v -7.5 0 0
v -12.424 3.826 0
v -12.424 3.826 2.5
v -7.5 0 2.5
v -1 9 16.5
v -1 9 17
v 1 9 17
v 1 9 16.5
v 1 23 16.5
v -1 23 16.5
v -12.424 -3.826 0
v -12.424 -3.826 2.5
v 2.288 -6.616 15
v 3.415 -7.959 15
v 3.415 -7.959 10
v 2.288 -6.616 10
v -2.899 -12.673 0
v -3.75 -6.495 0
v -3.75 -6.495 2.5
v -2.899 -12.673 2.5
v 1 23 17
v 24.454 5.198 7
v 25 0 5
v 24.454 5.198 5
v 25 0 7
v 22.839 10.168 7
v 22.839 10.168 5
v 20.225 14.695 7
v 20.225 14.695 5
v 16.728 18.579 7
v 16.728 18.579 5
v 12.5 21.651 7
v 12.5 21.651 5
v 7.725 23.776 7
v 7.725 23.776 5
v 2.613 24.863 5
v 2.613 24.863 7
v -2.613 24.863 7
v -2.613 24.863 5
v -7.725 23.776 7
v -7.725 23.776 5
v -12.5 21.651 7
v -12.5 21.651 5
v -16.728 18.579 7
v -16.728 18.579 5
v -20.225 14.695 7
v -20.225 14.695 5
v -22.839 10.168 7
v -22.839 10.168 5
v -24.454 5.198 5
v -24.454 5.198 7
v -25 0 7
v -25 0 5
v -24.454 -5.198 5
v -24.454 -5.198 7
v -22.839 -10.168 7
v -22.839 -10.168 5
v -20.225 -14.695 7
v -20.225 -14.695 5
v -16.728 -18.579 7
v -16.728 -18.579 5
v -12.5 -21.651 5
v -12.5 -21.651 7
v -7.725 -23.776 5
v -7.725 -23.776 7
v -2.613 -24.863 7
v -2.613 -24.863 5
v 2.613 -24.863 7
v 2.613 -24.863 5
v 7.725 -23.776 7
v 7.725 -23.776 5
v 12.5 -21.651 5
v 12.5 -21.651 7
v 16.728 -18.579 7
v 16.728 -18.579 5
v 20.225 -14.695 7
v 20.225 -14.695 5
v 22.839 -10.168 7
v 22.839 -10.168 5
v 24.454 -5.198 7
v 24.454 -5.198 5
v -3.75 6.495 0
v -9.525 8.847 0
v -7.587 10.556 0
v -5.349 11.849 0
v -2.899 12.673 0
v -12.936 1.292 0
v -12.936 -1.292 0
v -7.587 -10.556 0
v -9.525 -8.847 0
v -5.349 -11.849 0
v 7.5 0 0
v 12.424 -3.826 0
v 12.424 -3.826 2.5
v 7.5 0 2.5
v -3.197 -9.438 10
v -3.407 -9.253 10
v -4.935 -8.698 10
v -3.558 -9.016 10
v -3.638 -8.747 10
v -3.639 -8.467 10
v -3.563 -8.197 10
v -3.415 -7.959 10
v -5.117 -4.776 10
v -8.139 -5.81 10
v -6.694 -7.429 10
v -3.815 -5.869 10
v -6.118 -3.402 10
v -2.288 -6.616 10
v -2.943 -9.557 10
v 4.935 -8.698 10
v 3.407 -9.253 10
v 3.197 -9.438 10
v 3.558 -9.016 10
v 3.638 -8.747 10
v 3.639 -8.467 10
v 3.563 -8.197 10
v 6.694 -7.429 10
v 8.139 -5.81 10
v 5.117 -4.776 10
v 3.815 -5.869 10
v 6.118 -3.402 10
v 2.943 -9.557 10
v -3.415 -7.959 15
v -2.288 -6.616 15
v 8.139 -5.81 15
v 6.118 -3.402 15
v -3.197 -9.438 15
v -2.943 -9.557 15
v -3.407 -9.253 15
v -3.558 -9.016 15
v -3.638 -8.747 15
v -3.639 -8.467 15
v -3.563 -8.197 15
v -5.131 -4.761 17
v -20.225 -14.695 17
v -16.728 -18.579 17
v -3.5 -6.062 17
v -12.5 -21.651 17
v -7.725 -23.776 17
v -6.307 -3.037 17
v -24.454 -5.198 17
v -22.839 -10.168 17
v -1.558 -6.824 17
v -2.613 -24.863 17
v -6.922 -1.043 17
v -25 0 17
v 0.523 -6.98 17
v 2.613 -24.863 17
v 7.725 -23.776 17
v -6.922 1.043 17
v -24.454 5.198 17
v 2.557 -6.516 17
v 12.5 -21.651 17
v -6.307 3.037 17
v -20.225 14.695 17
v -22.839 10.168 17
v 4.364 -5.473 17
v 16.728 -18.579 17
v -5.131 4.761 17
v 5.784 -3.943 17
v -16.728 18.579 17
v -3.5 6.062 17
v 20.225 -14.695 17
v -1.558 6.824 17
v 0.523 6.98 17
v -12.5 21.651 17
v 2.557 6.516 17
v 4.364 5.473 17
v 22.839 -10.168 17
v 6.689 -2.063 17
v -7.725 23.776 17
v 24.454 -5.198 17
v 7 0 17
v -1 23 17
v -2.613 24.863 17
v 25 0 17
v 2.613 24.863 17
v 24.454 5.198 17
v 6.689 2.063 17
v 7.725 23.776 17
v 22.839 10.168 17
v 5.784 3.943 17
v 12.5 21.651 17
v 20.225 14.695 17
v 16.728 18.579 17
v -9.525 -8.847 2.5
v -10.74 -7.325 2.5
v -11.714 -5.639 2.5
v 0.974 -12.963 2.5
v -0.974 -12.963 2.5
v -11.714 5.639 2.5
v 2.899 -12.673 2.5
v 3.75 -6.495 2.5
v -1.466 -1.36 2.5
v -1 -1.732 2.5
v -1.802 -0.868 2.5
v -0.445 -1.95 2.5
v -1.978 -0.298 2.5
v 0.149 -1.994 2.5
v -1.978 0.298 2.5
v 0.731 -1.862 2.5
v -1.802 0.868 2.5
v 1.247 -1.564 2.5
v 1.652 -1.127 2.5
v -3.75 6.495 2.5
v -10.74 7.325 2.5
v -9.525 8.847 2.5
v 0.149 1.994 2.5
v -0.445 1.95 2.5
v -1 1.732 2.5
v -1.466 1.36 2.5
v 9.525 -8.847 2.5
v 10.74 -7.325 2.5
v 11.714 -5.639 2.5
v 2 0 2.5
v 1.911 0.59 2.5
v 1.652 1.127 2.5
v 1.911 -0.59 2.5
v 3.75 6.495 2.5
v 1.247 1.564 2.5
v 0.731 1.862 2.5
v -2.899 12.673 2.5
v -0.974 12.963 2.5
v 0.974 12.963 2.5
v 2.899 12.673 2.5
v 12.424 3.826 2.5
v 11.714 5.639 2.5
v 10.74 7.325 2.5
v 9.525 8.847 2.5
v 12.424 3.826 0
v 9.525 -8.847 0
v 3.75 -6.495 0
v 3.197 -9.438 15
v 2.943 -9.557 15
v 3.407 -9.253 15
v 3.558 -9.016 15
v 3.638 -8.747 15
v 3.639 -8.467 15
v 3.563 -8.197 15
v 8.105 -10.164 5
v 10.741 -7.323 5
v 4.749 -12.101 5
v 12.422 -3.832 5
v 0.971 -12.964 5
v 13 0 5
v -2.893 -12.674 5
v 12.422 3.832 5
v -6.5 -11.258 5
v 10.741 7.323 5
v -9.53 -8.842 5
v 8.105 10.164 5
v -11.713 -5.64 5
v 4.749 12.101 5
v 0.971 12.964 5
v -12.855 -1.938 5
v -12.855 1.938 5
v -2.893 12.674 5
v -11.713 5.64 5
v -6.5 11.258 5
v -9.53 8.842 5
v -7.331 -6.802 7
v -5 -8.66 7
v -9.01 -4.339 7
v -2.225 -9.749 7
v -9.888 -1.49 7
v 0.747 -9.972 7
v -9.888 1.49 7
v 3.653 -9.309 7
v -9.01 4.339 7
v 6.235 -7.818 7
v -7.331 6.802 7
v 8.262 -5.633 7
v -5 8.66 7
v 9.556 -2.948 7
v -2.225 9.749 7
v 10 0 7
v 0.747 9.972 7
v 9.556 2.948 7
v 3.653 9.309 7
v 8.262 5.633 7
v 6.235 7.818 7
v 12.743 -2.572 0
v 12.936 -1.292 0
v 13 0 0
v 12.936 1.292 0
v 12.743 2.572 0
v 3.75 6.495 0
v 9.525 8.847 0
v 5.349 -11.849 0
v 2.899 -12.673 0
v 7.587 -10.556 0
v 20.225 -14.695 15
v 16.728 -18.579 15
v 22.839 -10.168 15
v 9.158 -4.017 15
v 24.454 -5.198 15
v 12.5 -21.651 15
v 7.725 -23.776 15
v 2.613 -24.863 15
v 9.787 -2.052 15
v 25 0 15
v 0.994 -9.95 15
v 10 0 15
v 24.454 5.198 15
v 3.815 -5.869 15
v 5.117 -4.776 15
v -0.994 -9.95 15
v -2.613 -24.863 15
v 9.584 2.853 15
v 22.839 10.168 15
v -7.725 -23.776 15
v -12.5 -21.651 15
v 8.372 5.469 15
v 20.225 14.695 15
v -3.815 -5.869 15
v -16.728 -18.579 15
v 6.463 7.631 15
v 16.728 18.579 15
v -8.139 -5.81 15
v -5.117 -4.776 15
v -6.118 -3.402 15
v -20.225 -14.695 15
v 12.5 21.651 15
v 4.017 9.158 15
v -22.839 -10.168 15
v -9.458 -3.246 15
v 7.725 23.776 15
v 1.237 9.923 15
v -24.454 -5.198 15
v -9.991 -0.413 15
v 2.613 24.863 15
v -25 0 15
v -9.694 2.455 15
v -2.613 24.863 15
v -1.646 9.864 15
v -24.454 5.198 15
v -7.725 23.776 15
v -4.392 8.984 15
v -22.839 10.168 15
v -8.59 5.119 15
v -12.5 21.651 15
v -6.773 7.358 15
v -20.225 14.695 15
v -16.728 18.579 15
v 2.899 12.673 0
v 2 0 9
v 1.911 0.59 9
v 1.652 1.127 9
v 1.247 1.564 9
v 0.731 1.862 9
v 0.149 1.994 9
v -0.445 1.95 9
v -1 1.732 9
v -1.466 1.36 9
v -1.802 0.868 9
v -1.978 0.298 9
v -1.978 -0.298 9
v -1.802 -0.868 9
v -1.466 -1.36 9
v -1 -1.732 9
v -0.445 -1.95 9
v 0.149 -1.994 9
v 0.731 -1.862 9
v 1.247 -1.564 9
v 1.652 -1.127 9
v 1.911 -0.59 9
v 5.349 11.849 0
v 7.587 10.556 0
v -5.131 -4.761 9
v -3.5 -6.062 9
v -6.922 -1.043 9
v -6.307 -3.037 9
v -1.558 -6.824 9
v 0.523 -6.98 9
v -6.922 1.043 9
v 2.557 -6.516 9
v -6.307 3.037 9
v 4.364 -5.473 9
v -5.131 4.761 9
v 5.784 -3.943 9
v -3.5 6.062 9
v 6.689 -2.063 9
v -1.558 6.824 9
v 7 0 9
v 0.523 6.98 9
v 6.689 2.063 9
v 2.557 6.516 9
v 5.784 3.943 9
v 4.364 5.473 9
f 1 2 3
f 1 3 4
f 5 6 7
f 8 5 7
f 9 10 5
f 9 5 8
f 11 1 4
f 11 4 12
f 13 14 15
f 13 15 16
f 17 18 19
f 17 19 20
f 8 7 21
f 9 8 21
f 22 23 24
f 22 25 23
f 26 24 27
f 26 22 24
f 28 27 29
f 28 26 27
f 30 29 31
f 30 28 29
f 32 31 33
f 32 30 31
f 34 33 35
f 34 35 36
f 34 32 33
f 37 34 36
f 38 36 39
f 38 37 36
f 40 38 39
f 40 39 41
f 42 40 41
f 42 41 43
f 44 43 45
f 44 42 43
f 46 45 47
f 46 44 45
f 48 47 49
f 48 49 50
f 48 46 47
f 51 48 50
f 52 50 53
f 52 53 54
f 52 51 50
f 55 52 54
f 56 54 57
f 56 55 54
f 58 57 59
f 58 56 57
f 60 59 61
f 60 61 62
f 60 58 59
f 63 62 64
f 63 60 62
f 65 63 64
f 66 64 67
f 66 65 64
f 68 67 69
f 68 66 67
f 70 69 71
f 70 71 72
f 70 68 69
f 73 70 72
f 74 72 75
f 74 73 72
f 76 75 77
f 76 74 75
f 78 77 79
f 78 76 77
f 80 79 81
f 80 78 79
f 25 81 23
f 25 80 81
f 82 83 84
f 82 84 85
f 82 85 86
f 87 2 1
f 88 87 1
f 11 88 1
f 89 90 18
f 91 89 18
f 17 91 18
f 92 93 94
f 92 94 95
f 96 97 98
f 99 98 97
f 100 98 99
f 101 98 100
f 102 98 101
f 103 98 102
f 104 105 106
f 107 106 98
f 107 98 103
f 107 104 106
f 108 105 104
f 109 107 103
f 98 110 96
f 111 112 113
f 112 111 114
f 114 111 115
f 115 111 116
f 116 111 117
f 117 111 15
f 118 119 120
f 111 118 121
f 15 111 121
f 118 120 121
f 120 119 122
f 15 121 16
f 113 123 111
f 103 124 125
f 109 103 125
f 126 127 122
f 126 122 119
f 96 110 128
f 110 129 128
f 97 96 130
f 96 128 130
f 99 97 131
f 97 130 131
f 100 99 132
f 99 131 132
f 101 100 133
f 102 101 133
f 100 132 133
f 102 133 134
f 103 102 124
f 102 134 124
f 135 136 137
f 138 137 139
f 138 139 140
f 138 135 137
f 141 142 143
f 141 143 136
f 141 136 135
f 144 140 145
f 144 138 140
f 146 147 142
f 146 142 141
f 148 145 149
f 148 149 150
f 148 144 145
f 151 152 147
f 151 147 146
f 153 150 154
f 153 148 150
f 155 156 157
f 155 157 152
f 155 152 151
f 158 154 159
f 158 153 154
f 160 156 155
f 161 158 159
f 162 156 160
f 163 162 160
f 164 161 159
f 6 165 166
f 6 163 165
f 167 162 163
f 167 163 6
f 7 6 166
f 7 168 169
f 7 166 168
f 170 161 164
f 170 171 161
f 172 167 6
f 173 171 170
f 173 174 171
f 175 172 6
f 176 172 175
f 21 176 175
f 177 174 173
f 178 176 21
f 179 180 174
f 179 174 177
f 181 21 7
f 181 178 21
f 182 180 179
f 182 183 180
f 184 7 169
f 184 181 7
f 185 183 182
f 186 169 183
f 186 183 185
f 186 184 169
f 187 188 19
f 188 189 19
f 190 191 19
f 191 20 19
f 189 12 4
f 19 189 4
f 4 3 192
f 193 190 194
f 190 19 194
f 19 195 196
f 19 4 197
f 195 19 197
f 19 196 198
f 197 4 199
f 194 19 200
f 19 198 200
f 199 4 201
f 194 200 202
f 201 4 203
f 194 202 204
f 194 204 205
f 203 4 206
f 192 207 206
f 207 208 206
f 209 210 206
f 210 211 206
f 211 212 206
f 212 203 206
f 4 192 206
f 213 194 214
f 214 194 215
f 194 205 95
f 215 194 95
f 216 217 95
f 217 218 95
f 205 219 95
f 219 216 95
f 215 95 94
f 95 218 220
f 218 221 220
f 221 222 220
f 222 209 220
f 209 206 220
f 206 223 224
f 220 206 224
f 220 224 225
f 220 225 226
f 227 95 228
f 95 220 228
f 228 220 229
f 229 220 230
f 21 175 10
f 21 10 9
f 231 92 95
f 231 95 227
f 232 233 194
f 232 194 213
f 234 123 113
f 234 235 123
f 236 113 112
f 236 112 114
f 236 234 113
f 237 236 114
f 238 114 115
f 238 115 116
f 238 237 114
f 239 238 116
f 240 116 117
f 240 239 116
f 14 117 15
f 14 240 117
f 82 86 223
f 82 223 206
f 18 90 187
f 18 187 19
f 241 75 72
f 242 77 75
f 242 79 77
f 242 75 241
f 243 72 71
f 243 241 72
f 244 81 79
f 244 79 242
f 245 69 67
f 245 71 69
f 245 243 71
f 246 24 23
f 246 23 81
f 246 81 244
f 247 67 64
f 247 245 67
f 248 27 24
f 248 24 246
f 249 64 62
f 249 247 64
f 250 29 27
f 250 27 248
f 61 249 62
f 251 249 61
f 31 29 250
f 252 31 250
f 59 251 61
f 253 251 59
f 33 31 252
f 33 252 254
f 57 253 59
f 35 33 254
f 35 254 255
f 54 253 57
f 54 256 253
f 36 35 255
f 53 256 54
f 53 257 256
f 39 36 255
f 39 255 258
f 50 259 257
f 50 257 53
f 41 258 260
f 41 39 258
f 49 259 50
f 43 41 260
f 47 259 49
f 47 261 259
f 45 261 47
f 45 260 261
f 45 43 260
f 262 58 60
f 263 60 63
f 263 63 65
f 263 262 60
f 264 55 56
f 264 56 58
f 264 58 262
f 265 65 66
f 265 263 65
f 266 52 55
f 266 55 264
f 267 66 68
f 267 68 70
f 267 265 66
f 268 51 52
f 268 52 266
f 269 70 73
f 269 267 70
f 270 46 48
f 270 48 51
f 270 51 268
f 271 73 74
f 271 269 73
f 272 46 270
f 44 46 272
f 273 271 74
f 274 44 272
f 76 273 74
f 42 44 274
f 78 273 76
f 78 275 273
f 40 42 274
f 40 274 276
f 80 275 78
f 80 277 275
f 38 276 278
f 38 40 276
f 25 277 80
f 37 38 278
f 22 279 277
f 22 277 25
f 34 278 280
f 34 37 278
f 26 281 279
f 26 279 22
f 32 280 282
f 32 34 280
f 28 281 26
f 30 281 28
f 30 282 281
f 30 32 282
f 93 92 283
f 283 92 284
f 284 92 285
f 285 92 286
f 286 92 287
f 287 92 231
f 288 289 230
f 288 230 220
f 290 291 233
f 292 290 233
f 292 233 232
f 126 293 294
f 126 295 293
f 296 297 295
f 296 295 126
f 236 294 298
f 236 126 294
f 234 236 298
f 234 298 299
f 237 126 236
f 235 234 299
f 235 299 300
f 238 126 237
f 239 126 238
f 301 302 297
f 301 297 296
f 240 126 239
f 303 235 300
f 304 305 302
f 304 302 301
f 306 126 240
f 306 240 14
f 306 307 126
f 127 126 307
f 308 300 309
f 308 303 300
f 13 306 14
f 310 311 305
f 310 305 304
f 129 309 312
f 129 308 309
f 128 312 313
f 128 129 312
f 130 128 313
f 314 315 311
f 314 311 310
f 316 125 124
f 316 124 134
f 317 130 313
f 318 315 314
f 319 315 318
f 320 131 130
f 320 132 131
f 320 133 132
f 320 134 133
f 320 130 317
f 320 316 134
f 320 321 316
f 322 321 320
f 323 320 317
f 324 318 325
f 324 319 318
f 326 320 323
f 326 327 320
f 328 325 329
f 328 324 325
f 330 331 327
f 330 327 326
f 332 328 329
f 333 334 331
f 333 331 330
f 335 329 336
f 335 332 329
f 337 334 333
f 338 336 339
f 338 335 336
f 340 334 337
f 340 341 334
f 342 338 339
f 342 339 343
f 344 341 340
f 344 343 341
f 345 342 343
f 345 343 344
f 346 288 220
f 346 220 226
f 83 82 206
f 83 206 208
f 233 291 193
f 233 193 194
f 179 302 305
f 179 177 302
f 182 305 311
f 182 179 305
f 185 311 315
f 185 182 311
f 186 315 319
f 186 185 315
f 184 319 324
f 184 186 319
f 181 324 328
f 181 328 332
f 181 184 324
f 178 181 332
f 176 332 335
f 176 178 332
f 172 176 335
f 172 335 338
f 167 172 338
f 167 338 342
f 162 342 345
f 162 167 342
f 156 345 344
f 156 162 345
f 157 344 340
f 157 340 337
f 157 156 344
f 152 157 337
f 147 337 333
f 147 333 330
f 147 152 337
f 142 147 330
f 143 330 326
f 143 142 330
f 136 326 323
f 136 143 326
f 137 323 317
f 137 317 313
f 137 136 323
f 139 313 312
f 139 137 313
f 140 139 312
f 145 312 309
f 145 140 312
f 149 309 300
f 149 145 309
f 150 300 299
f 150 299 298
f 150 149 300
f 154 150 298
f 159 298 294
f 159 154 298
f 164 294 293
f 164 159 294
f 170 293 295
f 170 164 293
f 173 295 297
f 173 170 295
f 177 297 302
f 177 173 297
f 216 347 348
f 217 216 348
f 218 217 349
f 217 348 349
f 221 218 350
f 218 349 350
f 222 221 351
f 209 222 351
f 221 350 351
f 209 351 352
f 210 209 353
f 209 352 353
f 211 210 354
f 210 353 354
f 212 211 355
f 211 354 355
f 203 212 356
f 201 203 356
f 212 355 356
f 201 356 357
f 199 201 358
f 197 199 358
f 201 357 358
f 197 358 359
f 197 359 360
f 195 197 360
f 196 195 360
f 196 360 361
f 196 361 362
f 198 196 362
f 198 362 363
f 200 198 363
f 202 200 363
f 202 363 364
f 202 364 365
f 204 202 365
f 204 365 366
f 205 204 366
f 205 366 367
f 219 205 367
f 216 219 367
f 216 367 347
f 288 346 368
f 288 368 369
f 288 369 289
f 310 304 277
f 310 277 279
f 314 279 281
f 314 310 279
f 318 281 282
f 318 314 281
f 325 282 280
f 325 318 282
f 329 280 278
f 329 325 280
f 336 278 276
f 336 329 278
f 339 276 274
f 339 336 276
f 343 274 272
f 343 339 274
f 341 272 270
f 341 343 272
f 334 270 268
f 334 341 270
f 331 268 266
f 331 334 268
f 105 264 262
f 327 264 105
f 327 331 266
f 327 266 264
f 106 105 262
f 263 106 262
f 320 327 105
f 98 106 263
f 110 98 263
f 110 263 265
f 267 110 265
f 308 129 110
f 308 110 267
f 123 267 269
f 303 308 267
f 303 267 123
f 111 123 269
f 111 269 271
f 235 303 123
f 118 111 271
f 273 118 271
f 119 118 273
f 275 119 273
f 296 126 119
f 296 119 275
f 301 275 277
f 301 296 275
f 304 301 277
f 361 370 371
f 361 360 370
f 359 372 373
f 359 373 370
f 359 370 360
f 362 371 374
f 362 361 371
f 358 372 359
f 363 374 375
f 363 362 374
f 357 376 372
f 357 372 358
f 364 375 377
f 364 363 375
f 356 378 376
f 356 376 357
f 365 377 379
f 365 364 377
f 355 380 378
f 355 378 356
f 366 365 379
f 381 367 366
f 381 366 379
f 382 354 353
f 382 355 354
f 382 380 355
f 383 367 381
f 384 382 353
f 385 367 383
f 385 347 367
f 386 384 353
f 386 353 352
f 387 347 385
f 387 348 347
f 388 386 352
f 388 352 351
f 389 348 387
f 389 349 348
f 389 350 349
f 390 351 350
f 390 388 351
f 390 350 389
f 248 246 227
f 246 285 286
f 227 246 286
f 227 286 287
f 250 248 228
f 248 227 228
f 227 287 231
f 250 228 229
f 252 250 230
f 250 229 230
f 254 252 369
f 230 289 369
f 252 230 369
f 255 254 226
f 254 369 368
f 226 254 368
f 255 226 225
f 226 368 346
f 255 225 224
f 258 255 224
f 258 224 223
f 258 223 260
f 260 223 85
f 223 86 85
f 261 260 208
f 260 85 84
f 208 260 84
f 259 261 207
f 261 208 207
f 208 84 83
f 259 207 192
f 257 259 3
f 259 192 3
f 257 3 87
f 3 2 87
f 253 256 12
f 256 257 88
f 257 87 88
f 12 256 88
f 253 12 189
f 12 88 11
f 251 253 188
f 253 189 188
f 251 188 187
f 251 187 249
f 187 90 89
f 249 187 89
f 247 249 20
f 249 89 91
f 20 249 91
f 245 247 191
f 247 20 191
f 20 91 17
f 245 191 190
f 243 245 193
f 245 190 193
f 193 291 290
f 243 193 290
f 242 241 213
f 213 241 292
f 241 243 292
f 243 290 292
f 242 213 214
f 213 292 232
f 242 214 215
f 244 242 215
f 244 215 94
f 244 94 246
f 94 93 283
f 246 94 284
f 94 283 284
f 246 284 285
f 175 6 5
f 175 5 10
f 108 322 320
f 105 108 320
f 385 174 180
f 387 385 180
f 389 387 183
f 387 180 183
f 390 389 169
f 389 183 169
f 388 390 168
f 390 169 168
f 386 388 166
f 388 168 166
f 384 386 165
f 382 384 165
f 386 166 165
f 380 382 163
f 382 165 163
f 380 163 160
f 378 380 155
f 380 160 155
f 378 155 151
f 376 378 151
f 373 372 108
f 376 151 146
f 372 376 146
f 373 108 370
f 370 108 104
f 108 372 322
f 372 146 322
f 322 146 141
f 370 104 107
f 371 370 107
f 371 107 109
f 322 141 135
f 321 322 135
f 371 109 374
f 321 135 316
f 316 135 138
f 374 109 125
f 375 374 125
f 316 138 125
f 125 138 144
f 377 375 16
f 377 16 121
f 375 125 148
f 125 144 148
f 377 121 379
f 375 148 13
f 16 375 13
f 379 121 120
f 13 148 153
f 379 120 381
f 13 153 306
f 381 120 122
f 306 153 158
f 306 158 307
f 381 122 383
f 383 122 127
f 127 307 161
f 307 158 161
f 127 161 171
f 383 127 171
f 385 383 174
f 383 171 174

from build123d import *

# Parameters (mm, degrees)
SKETCH_3_R          = 13
EXTRUDE_1_DEPTH     = 5
CUT_EXTRUDE_2_DEPTH = 2.5
SKETCH_6_R          = 2
CUT_EXTRUDE_3_DEPTH = 18
SKETCH_7_R          = 7
CUT_EXTRUDE_4_DEPTH = 8
CUT_EXTRUDE_6_DEPTH = 5
FILLET_1_R          = 1
SKETCH_10_W         = 2
SKETCH_10_H         = 14
CUT_EXTRUDE_7_DEPTH = 0.5


with BuildPart() as part:
    # ｽｹｯﾁ3 → ﾎﾞｽ - 押し出し1 (new body)
    with BuildSketch(Plane.XY):
        Circle(SKETCH_3_R)
    extrude(amount=EXTRUDE_1_DEPTH)

    # ｽｹｯﾁ2 → ｶｯﾄ - 押し出し2 (cut)
    with BuildSketch(Plane.XY):
        with BuildLine():
            Line((3.75, 6.495190528), (2.773808556, 13.582081265))
            ThreePointArc((2.773808556, 13.582081265), (0, 16), (-2.773808556, 13.582081265))
            Line((-2.773808556, 13.582081265), (-3.75, 6.495190528))
            Line((-3.75, 6.495190528), (-10.375523134, 9.193229308))
            ThreePointArc((-10.375523134, 9.193229308), (-13.856406461, 8), (-13.14933169, 4.388851958))
            Line((-13.14933169, 4.388851958), (-7.5, 0))
            Line((-7.5, 0), (-13.14933169, -4.388851958))
            ThreePointArc((-13.14933169, -4.388851958), (-13.856406461, -8), (-10.375523134, -9.193229308))
            Line((-10.375523134, -9.193229308), (-3.75, -6.495190528))
            Line((-3.75, -6.495190528), (-2.773808556, -13.582081265))
            ThreePointArc((-2.773808556, -13.582081265), (0, -16), (2.773808556, -13.582081265))
            Line((2.773808556, -13.582081265), (3.75, -6.495190528))
            Line((3.75, -6.495190528), (10.375523134, -9.193229308))
            ThreePointArc((10.375523134, -9.193229308), (13.856406461, -8), (13.14933169, -4.388851958))
            Line((13.14933169, -4.388851958), (7.5, 0))
            Line((7.5, 0), (13.14933169, 4.388851958))
            ThreePointArc((13.14933169, 4.388851958), (13.856406461, 8), (10.375523134, 9.193229308))
            Line((10.375523134, 9.193229308), (3.75, 6.495190528))
        make_face()
    extrude(amount=CUT_EXTRUDE_2_DEPTH, mode=Mode.SUBTRACT)

    # ｽｹｯﾁ5 → 回転1 (revolve)
    with BuildSketch(Plane(origin=(0, 0, 0), x_dir=(1, 0, 0), z_dir=(0, 1, 0))):
        Polygon((0, -5), (25, -5), (25, -7), (10, -7), (10, -15), (25, -15), (25, -17), (0, -17), align=None)
    revolve(axis=Axis((0, 0, 0), (0, 0, 1)))

    # ｽｹｯﾁ6 → ｶｯﾄ - 押し出し3 (cut, through all)
    with BuildSketch(Plane.XY.offset(17)):
        Circle(SKETCH_6_R)
    extrude(amount=-CUT_EXTRUDE_3_DEPTH, mode=Mode.SUBTRACT)

    # ｽｹｯﾁ7 → ｶｯﾄ - 押し出し4 (cut)
    with BuildSketch(Plane.XY.offset(17)):
        Circle(SKETCH_7_R)
    extrude(amount=-CUT_EXTRUDE_4_DEPTH, mode=Mode.SUBTRACT)

    # ｽｹｯﾁ9 → ｶｯﾄ - 押し出し6 (cut)
    with BuildSketch(Plane(origin=(0, 0, 15), x_dir=(-1, 0, 0), z_dir=(0, 0, -1))):
        Polygon((-3.843473937, -0.691164305), (-11.556925253, -9.883697623), (-7.726703038, -13.097635671), (-0.013251721, -3.905102354), align=None)
    cut_extrude_6 = extrude(amount=CUT_EXTRUDE_6_DEPTH, mode=Mode.SUBTRACT)

    # ﾐﾗｰ1: ｶｯﾄ - 押し出し6 across plane
    add(cut_extrude_6.mirror(Plane(origin=(0, 0, 0), x_dir=(0, 0, 1), z_dir=(1, 0, 0))), mode=Mode.SUBTRACT)

    # ﾌｨﾚｯﾄ1
    fillet_1_edges = [part.edges().sort_by_distance(p)[0] for p in [
        (4.308653161, -9.024162451, 12.5),
        (-4.308653161, -9.024162451, 12.5),
    ]]
    fillet(fillet_1_edges, radius=FILLET_1_R)

    # ｽｹｯﾁ10 → ｶｯﾄ - 押し出し7 (cut)
    with BuildSketch(Plane.XY.offset(17)):
        with Locations((0, 16)):
            Rectangle(SKETCH_10_W, SKETCH_10_H)
    extrude(amount=-CUT_EXTRUDE_7_DEPTH, mode=Mode.SUBTRACT)


solid = part.part
